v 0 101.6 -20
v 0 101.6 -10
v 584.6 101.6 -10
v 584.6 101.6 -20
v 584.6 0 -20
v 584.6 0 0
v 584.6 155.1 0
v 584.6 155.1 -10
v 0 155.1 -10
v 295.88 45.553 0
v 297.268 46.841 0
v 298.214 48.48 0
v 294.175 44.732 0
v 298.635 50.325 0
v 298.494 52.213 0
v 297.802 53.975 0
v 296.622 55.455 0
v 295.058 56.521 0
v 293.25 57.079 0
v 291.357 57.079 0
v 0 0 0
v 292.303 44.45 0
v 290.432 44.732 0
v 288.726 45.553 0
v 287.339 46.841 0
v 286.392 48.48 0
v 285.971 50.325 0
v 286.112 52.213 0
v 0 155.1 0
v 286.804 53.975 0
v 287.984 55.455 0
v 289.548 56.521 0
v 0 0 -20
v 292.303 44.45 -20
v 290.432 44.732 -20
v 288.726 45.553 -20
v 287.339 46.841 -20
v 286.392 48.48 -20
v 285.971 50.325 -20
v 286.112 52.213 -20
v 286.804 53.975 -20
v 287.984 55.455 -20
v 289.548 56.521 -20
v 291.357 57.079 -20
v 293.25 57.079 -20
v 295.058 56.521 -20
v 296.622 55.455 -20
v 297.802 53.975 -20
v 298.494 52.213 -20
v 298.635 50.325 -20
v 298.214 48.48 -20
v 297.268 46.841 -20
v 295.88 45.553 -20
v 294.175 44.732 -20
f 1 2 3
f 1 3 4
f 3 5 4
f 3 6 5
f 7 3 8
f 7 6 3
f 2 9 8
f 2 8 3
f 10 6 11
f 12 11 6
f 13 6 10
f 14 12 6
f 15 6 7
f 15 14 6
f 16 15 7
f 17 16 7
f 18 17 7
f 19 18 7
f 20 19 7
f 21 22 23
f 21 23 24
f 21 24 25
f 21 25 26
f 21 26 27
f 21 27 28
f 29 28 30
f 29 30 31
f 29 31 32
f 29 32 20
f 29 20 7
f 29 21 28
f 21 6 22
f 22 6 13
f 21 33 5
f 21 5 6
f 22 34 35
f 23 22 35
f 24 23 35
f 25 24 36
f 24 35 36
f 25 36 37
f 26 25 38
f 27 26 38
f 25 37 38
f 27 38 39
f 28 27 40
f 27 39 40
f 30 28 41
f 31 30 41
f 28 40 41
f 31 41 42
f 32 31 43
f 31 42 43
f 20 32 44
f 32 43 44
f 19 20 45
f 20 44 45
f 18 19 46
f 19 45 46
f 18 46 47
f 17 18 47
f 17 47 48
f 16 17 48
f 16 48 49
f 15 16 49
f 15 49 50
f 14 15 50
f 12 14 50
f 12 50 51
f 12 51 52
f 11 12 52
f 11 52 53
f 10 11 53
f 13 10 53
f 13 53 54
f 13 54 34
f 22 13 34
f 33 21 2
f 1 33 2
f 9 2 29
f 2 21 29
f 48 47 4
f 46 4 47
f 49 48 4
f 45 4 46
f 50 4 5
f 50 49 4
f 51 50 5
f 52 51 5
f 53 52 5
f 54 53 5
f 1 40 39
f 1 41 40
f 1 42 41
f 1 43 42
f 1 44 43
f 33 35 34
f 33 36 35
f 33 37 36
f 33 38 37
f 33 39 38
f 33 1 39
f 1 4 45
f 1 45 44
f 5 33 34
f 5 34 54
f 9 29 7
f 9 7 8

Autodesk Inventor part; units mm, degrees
ref_plane "YZ Plane" through (0, 0, 0) normal (1, 0, 0) x (0, 1, 0)
ref_plane "XZ Plane" through (0, 0, 0) normal (0, 1, 0) x (-1, 0, 0)
sketch "Sketch1" plane through (0, 0, 0) normal (1, 0, 0) x (0, 1, 0)
  line L0 (0, 0) -> (155.1, 0)
  line L1 (155.1, 0) -> (155.1, -10)
  line L2 (0, -20) -> (0, 0)
  line L3 (155.1, -10) -> (101.6, -10)
  line L4 (101.6, -10) -> (101.6, -20)
  line L5 (101.6, -20) -> (0, -20)
  dimension "d0" = 53.5
  dimension "d1" = 155.1
  dimension "d2" = 10
  dimension "d3" = 10
  dimension "d4" = 20
extrude "Extrusion1" add sketch "Sketch1" along normal blind 584.6
ref_plane "Work Plane2" through (609.4222, 0, -20) normal (0, 0, -1) x (-1, 0, 0)
sketch "Sketch4" plane through (0, 0, 0) normal (0, 0, 1) x (1, 0, 0)
  line L0 (0, 0) -> (0, 155.1) projected
  line L1 (0, 0) -> (292.3032, 0)
  line L2 (0, 0) -> (584.6, 0) projected
  line L3 (292.3032, 50.8) -> (292.3032, 0)
  dimension "d38" = 292.3032
  dimension "d39" = 50.8
hole "Hole1" at (292.3032, 50.8, 0) direction (0, 0, -1) diameter 12.7 end through all
properties part number "SkinnySideWOpposite" material "Wood (Birch)"
